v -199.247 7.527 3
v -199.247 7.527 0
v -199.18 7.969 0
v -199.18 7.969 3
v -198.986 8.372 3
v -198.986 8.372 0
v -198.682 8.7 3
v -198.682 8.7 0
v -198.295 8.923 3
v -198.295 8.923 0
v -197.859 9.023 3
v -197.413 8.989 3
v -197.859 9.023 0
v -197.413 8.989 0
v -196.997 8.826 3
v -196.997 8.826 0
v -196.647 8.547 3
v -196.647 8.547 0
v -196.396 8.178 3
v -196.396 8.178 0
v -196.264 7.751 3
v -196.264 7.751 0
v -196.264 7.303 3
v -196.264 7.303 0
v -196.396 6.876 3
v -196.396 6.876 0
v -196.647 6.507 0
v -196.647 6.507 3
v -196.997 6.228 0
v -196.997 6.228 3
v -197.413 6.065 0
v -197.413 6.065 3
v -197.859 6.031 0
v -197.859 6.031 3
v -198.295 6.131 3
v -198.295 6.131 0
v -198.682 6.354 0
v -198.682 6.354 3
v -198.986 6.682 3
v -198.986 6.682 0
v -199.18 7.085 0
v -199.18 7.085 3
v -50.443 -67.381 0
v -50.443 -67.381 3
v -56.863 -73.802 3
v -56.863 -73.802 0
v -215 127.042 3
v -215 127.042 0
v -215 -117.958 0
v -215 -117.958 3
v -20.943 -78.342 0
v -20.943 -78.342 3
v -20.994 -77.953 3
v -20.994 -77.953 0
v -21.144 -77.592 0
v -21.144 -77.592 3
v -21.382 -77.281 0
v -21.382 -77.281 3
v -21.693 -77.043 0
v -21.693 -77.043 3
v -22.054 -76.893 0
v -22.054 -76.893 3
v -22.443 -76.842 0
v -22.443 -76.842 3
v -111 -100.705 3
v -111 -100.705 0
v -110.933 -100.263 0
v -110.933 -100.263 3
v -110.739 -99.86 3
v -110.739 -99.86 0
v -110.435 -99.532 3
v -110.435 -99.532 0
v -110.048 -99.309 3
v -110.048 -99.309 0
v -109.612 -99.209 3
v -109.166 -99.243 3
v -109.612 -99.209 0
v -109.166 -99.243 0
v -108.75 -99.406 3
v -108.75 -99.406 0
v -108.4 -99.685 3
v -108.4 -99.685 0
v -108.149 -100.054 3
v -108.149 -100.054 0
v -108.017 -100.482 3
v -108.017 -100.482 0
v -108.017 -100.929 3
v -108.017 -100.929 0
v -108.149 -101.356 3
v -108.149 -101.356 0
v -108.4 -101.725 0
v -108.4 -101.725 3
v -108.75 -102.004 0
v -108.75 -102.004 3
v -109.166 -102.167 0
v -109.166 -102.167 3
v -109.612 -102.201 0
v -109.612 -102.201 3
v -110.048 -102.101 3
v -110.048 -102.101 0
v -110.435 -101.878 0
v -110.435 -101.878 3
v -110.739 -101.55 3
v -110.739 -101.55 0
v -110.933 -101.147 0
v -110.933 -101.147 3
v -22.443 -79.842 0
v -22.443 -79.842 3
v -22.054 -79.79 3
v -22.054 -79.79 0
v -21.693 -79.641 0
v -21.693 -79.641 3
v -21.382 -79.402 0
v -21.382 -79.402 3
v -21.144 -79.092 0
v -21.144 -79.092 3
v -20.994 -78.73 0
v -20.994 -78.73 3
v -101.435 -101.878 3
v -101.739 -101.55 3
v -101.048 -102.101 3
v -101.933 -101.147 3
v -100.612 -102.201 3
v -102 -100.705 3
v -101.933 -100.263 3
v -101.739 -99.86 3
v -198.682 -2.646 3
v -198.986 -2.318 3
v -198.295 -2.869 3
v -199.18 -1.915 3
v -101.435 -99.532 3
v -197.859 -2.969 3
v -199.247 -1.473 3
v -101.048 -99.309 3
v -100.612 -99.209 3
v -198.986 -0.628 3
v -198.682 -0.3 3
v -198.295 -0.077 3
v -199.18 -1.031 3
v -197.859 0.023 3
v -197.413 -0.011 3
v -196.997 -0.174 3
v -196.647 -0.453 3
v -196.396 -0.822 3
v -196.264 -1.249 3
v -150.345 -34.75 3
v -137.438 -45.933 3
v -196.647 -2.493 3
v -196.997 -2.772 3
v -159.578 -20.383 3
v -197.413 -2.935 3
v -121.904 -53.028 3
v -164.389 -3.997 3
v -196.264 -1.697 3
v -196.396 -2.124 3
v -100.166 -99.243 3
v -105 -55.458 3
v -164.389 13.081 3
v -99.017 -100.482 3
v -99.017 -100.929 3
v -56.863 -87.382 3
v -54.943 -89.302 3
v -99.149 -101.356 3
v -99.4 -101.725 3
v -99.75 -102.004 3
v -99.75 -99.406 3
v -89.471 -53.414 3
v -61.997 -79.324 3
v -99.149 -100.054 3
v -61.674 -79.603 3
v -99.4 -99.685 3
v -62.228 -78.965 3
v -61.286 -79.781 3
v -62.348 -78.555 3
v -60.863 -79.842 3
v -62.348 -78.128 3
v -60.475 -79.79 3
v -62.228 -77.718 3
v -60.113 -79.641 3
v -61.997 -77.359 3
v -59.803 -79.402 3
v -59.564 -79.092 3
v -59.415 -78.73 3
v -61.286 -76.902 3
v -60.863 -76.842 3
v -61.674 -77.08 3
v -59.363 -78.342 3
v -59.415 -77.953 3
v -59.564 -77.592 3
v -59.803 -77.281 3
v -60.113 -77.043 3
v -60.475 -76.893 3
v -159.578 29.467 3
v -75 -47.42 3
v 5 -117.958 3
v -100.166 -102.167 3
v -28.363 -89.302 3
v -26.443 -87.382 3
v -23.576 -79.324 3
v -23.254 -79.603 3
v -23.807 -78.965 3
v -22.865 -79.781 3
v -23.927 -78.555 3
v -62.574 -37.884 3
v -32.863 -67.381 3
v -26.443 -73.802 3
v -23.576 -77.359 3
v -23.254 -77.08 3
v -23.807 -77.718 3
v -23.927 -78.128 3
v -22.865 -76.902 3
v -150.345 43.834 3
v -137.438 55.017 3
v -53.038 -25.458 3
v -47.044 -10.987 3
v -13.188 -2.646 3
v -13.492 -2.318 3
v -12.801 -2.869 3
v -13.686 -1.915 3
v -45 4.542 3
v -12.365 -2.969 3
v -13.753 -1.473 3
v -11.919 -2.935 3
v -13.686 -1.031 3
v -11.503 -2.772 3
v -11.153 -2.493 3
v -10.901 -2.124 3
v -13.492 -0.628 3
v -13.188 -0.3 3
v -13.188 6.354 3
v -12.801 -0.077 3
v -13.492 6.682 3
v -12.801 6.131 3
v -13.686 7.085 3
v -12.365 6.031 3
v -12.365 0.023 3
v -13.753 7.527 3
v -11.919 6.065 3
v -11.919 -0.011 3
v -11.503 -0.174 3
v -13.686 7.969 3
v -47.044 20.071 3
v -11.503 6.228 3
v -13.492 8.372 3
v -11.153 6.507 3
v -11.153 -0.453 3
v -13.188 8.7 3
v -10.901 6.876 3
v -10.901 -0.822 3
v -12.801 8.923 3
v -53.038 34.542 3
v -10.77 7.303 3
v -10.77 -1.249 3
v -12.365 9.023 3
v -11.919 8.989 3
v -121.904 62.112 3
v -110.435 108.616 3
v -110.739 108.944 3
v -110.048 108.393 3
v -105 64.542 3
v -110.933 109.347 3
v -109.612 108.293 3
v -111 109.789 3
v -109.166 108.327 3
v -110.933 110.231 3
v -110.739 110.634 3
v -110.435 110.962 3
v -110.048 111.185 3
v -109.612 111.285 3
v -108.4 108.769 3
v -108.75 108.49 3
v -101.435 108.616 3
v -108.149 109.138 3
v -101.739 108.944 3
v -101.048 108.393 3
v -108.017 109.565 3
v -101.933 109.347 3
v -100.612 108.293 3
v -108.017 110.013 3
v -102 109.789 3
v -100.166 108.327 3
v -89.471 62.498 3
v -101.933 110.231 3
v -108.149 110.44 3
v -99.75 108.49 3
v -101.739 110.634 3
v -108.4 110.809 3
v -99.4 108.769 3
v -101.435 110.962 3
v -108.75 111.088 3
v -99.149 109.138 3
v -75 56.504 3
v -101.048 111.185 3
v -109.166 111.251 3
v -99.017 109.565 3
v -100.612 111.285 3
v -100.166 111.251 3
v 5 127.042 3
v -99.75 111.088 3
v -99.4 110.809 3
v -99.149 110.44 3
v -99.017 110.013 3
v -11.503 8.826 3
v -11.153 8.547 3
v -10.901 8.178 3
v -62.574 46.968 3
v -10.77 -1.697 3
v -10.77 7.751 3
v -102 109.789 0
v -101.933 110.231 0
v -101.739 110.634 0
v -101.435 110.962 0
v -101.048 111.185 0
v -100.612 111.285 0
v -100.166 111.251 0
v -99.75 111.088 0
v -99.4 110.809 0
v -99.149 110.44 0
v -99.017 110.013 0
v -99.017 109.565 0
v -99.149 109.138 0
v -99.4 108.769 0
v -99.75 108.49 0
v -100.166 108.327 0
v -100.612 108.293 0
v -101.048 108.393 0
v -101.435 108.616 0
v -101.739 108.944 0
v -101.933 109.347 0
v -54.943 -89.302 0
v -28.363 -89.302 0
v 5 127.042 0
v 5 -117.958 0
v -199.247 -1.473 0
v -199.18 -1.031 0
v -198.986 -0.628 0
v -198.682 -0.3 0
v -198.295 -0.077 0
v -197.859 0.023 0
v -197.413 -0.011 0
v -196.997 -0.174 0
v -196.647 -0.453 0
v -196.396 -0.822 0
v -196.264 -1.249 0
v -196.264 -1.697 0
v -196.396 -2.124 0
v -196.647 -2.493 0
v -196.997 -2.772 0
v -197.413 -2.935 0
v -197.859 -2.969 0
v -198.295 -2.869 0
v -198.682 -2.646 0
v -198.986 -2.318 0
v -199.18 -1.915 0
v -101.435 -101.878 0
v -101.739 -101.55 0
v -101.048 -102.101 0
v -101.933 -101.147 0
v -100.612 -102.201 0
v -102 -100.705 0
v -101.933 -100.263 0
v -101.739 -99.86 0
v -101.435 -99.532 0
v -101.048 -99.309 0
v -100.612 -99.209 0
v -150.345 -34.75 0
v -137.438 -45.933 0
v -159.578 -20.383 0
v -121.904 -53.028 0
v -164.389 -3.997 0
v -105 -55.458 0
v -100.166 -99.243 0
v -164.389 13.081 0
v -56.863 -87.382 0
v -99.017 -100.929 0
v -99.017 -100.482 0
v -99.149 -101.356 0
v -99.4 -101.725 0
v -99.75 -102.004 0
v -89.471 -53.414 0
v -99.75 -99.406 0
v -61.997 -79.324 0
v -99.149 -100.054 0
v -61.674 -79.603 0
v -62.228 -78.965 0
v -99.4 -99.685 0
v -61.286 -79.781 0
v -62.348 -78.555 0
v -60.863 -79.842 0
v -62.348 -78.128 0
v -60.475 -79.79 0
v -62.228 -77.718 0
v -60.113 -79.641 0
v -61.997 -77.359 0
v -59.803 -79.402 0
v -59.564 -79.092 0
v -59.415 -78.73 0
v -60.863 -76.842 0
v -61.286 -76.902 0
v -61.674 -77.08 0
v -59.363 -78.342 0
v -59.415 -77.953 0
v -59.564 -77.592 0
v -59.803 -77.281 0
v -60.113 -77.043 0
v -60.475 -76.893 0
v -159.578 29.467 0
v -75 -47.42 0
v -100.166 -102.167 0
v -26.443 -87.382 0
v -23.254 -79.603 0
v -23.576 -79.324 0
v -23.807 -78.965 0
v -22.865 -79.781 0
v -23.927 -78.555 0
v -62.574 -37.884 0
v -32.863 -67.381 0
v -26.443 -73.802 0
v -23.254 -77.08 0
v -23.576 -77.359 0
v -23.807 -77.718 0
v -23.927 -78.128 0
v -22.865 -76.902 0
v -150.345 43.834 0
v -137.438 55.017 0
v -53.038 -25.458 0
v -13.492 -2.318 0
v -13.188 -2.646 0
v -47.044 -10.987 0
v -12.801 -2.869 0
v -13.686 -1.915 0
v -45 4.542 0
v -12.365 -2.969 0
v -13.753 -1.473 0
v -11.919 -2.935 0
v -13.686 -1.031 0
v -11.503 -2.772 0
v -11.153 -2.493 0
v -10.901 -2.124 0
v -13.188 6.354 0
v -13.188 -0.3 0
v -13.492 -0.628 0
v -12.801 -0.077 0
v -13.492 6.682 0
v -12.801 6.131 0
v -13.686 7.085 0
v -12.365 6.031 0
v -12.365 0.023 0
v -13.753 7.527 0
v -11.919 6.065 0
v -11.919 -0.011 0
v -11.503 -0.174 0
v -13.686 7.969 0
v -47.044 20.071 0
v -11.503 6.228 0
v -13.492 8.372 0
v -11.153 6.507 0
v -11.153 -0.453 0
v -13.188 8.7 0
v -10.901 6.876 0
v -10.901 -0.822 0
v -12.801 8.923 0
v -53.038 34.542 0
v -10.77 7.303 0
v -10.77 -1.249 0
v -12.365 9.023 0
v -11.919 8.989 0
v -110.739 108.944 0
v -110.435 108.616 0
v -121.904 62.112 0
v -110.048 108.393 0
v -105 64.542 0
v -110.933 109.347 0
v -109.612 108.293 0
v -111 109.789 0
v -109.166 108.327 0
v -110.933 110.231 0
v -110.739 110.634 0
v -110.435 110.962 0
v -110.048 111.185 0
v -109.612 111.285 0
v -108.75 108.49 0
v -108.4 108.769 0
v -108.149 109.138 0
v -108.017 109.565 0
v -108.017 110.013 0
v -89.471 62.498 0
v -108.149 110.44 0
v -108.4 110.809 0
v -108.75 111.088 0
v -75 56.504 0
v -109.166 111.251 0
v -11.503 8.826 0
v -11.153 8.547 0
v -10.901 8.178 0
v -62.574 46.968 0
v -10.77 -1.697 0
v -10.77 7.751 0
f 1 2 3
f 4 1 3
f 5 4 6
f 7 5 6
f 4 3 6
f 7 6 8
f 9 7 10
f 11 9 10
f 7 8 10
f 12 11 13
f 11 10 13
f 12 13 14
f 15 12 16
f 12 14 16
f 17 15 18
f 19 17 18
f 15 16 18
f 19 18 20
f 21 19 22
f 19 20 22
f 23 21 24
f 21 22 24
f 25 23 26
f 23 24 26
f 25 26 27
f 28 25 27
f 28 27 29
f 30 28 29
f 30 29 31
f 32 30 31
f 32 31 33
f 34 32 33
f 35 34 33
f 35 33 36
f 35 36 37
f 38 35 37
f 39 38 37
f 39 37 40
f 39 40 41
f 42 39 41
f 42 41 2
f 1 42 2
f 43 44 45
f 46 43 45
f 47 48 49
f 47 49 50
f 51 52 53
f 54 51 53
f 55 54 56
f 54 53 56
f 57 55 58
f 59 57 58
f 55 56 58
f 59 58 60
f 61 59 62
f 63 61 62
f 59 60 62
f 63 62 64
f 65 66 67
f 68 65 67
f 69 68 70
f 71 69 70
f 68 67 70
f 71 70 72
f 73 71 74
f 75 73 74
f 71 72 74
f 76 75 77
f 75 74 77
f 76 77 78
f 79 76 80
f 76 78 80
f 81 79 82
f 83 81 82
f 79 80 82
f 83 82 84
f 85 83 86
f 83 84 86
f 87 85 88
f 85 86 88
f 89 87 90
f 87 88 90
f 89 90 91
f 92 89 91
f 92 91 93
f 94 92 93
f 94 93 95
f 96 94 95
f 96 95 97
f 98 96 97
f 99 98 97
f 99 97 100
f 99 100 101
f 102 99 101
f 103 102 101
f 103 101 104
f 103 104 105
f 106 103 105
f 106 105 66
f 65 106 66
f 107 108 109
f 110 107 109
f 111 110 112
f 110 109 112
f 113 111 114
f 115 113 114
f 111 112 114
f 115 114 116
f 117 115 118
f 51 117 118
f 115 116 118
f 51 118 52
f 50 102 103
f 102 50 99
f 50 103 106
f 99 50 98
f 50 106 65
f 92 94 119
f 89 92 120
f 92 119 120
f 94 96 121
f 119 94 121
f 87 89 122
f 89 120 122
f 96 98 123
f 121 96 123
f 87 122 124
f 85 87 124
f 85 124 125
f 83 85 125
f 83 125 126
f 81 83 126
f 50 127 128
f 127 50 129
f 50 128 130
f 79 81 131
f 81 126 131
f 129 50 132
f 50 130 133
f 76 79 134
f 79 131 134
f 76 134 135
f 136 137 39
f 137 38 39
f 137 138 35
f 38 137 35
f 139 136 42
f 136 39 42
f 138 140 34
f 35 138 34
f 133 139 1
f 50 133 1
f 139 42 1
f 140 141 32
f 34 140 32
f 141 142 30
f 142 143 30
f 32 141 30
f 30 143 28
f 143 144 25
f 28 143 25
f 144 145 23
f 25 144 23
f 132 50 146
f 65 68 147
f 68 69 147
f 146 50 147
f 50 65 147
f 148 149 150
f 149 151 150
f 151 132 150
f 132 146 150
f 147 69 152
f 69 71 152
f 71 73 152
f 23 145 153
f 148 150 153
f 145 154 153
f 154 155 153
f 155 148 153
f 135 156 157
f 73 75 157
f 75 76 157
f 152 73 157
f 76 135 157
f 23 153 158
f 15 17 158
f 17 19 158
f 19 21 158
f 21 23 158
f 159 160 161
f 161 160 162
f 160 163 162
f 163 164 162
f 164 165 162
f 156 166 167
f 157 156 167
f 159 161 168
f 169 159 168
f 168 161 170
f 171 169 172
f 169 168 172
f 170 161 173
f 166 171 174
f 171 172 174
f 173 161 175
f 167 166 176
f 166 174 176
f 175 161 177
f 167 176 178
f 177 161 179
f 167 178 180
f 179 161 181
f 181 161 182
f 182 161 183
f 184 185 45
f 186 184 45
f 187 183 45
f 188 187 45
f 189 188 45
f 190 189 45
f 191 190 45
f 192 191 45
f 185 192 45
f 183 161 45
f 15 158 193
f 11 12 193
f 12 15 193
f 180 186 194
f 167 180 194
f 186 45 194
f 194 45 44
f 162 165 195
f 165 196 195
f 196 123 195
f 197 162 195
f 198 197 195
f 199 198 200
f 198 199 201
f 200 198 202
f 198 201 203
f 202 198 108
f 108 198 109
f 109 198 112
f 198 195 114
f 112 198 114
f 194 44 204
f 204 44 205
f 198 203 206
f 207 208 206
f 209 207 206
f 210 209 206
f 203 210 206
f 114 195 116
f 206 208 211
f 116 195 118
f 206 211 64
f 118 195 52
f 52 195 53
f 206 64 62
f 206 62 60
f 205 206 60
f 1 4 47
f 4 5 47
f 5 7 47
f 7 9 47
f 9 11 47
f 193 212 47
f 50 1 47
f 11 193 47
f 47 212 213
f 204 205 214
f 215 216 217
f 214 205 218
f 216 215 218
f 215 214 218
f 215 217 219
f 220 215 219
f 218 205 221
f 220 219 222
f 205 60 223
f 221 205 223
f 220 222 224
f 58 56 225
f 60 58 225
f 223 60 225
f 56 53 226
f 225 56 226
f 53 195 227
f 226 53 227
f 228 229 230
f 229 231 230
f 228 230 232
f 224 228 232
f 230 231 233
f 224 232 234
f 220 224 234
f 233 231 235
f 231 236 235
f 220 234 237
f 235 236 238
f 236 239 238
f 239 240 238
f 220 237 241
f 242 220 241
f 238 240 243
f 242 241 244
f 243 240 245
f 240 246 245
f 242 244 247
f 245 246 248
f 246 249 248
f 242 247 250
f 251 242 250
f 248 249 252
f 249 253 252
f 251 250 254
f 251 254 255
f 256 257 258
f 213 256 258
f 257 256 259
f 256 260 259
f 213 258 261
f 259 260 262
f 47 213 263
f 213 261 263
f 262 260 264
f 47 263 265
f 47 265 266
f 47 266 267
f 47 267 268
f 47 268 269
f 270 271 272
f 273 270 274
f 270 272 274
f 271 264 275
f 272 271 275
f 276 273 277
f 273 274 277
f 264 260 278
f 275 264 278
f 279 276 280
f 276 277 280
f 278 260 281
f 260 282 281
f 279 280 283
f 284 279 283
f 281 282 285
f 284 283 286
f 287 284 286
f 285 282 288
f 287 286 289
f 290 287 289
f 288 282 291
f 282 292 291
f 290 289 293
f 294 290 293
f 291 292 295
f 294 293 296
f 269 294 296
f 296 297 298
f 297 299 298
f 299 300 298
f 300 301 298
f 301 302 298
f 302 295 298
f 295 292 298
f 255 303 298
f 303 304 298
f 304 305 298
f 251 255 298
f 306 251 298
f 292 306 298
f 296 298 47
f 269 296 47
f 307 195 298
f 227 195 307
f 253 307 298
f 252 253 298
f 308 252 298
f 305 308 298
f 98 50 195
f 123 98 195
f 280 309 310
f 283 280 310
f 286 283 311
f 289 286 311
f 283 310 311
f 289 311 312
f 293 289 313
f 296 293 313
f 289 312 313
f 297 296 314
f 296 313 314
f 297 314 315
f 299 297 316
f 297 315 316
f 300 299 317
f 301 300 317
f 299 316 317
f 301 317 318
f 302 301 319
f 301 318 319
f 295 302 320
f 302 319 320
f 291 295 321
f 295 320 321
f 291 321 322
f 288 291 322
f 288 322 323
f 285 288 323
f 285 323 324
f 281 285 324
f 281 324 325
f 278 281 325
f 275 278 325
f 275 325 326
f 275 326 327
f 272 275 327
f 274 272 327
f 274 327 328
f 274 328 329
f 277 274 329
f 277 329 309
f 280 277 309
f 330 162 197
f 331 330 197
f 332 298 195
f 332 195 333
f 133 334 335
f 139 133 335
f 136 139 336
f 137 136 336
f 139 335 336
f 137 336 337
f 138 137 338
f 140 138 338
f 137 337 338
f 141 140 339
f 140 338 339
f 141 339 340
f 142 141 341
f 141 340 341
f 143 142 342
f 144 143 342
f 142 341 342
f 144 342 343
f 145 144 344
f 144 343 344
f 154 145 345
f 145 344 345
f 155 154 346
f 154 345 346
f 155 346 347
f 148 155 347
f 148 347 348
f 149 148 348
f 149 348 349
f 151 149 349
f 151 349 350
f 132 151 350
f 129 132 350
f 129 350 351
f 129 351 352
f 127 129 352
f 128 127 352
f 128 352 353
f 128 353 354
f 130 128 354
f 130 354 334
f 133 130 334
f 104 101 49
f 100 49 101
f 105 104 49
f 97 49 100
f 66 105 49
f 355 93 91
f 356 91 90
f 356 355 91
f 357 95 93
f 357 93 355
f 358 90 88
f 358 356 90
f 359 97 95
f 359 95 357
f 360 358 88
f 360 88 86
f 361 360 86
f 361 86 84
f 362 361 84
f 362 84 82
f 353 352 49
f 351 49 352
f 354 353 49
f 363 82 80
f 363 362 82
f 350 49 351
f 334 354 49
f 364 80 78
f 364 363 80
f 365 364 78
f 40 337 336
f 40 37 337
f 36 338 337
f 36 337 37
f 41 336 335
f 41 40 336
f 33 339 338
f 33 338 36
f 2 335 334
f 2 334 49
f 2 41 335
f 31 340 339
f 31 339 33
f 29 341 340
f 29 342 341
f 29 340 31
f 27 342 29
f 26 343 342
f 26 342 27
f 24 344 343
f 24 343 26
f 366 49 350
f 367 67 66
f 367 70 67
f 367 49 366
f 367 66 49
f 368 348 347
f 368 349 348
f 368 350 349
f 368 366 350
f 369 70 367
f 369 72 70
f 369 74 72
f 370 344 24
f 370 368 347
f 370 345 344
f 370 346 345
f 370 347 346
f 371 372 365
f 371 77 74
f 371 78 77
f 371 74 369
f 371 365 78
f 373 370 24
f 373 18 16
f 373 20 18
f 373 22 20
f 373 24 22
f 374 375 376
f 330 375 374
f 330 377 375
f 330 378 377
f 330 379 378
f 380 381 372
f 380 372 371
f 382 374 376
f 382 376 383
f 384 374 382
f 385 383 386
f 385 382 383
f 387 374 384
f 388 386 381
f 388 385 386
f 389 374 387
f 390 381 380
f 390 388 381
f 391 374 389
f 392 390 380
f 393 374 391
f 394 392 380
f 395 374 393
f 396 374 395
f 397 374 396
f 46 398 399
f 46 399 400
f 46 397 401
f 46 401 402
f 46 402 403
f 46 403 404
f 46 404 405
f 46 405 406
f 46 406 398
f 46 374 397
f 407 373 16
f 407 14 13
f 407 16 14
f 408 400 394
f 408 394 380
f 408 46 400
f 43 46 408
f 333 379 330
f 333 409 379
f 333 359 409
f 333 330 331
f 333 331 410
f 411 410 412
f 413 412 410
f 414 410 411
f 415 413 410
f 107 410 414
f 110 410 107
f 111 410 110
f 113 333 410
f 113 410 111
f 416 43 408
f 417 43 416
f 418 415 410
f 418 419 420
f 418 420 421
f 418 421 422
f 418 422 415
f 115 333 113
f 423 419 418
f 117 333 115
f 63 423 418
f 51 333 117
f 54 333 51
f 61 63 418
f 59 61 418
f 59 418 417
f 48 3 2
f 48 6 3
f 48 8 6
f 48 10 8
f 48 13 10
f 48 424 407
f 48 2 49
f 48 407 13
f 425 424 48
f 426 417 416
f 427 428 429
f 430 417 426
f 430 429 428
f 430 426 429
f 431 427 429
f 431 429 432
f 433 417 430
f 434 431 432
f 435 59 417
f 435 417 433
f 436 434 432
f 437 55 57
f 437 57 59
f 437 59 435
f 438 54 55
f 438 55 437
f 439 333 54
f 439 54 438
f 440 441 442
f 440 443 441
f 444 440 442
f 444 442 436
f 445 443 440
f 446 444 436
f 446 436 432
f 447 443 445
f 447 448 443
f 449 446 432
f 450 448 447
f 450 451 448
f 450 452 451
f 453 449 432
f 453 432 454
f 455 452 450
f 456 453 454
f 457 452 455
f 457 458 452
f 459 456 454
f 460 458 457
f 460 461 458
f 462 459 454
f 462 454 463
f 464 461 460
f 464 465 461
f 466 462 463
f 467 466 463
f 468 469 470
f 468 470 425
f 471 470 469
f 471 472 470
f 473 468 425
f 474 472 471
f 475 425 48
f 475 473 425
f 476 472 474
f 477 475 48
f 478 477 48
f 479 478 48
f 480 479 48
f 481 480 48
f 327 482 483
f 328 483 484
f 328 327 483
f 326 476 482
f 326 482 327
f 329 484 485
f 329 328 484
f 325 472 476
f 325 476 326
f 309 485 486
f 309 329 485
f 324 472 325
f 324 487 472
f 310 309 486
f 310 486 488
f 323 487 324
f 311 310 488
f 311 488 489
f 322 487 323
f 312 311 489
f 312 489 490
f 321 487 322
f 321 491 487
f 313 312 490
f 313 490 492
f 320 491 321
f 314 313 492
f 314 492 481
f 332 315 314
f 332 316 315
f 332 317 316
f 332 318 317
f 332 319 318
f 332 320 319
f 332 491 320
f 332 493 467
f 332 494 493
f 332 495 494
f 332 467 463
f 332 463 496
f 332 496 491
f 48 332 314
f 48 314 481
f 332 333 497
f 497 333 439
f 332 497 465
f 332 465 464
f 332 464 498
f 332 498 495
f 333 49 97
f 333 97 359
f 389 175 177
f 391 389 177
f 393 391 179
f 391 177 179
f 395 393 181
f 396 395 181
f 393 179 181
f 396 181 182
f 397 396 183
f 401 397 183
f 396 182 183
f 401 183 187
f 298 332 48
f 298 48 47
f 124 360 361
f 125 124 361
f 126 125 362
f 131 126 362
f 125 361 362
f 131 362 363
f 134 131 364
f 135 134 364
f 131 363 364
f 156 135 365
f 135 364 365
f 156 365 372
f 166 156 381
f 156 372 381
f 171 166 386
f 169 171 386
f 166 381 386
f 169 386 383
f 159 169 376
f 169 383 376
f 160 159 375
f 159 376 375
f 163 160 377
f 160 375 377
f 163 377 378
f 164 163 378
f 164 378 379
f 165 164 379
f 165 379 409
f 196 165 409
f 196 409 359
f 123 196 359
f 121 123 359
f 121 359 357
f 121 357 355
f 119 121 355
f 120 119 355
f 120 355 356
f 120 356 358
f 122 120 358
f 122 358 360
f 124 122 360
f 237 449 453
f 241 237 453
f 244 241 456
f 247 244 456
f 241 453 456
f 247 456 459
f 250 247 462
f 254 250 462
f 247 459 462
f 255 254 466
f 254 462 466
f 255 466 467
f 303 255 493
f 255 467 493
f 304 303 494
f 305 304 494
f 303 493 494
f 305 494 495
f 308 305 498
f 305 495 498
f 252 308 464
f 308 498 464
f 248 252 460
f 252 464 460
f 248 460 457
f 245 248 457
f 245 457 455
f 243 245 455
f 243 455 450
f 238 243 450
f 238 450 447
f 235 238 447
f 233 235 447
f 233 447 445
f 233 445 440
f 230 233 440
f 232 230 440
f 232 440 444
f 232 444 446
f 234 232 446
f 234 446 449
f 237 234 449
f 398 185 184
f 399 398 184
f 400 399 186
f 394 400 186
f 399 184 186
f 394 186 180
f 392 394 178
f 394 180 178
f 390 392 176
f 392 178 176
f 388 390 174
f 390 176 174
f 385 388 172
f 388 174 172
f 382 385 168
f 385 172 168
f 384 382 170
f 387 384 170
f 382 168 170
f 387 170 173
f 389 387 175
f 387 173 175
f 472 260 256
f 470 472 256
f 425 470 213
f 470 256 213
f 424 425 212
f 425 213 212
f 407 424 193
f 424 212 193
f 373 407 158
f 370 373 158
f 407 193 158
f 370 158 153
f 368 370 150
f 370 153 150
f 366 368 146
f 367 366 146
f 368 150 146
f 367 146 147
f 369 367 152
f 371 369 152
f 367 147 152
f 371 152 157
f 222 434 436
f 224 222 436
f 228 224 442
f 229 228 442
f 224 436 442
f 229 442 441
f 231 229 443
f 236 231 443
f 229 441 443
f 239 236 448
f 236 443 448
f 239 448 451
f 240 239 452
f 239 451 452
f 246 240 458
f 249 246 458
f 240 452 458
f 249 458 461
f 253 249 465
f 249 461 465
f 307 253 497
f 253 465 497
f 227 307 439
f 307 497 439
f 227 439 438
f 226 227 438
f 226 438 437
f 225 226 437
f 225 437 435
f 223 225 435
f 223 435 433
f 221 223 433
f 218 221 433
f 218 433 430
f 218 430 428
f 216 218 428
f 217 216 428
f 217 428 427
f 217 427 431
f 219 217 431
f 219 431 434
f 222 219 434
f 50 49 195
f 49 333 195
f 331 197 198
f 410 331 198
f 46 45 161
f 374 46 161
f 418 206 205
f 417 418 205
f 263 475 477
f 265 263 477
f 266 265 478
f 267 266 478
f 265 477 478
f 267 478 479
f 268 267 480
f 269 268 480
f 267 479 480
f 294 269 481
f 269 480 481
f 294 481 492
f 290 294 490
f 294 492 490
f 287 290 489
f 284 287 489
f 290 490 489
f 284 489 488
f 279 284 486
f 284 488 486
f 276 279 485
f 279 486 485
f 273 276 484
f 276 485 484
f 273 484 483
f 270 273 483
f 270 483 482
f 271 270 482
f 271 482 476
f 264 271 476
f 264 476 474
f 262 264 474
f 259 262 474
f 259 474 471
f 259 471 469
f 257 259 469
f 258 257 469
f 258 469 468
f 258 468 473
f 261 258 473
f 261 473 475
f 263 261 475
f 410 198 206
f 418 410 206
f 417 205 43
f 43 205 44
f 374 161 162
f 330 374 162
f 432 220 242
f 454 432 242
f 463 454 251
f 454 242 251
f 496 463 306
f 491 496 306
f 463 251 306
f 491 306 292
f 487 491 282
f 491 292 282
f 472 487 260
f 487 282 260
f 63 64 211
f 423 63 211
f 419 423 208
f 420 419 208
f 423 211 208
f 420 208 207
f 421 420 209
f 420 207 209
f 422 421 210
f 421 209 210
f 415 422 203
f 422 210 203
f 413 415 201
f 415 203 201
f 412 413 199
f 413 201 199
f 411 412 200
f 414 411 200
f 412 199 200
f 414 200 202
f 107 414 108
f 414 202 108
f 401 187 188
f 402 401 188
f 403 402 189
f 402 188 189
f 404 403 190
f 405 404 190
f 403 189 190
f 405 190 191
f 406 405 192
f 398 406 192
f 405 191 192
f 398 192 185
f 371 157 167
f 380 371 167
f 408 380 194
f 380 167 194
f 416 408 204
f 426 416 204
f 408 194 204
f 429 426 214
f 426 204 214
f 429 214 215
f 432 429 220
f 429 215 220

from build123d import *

# Parameters (mm, degrees)
SKETCH1_W           = 210
SKETCH1_H           = 245
BOSS_EXTRUDE1_DEPTH = 3
CUT_EXTRUDE1_DEPTH  = 3
CUT_EXTRUDE2_DEPTH  = 3
CUT_EXTRUDE3_DEPTH  = 246.456036562
SKETCH5_W           = 3
SKETCH5_H           = 245
BOSS_EXTRUDE2_DEPTH = 5
SKETCH6_W           = 3
SKETCH6_H           = 245
BOSS_EXTRUDE3_DEPTH = 5
SKETCH7_R           = 1.5
CUT_EXTRUDE4_DEPTH  = 10


with BuildPart() as part:
    # Sketch1 → Boss-Extrude1 (new body)
    with BuildSketch(Plane.XY):
        with Locations((-105, 4.541984733)):
            Rectangle(SKETCH1_W, SKETCH1_H)
    extrude(amount=BOSS_EXTRUDE1_DEPTH)

    # Sketch2 → Cut-Extrude1 (cut)
    with BuildSketch(Plane.XY.offset(3)):
        with BuildLine():
            ThreePointArc((-45, 4.541984733), (-62.573593129, 46.968391604), (-105, 64.541984733))
            Line((-105, 64.541984733), (-105, -55.458015267))
            ThreePointArc((-105, -55.458015267), (-62.573593129, -37.884422138), (-45, 4.541984733))
        make_face()
        with BuildLine():
            Line((-105, -55.458015267), (-105, 64.541984733))
            ThreePointArc((-105, 64.541984733), (-165, 4.541984733), (-105, -55.458015267))
        make_face()
    extrude(amount=-CUT_EXTRUDE1_DEPTH, mode=Mode.SUBTRACT)

    # Sketch3 → Cut-Extrude2 (cut)
    with BuildSketch(Plane.XY.offset(3)):
        Polygon((-41.653041136, -88.602014661), (-41.653041136, -68.081199381), (-50.153041136, -68.081199381), (-56.163448776, -74.091607021), (-56.163448776, -87.091607021), (-54.653041136, -88.602014661), align=None)
        Polygon((-41.653041136, -68.081199381), (-41.653041136, -67.381199381), (-50.442990629, -67.381199381), (-56.863448776, -73.801657527), (-56.863448776, -87.381556515), (-54.942990629, -89.302014661), (-41.653041136, -89.302014661), (-41.653041136, -88.602014661), (-54.653041136, -88.602014661), (-56.163448776, -87.091607021), (-56.163448776, -74.091607021), (-50.153041136, -68.081199381), align=None)
        Polygon((-33.153041136, -68.081199381), (-41.653041136, -68.081199381), (-41.653041136, -88.602014661), (-28.653041136, -88.602014661), (-27.142633496, -87.091607021), (-27.142633496, -74.091607021), align=None)
        Polygon((-32.863091642, -67.381199381), (-41.653041136, -67.381199381), (-41.653041136, -68.081199381), (-33.153041136, -68.081199381), (-27.142633496, -74.091607021), (-27.142633496, -87.091607021), (-28.653041136, -88.602014661), (-41.653041136, -88.602014661), (-41.653041136, -89.302014661), (-28.363091642, -89.302014661), (-26.442633496, -87.381556515), (-26.442633496, -73.801657527), align=None)
    extrude(amount=-CUT_EXTRUDE2_DEPTH, mode=Mode.SUBTRACT)

    # Sketch4 → Cut-Extrude3 (cut, through all)
    with BuildSketch(Plane.XY.offset(3)):
        with BuildLine():
            ThreePointArc((-60.863448776, -76.841607021), (-62.363448776, -78.341607021), (-60.863448776, -79.841607021))
            Line((-60.863448776, -79.841607021), (-60.863448776, -76.841607021))
        make_face()
        with BuildLine():
            Line((-60.863448776, -76.841607021), (-60.863448776, -79.841607021))
            ThreePointArc((-60.863448776, -79.841607021), (-59.802788604, -79.402267193), (-59.363448776, -78.341607021))
            ThreePointArc((-59.363448776, -78.341607021), (-59.802788604, -77.280946849), (-60.863448776, -76.841607021))
        make_face()
        with BuildLine():
            ThreePointArc((-22.442633496, -76.841607021), (-23.942633496, -78.341607021), (-22.442633496, -79.841607021))
            Line((-22.442633496, -79.841607021), (-22.442633496, -76.841607021))
        make_face()
        with BuildLine():
            Line((-22.442633496, -76.841607021), (-22.442633496, -79.841607021))
            ThreePointArc((-22.442633496, -79.841607021), (-21.381973324, -79.402267193), (-20.942633496, -78.341607021))
            ThreePointArc((-20.942633496, -78.341607021), (-21.381973324, -77.280946849), (-22.442633496, -76.841607021))
        make_face()
    extrude(amount=-CUT_EXTRUDE3_DEPTH, mode=Mode.SUBTRACT)

    # Sketch5 → Boss-Extrude2 (add)
    with BuildSketch(Plane(origin=(0, 0, 0), x_dir=(0, 0, -1), z_dir=(1, 0, 0))):
        with Locations((-1.5, 4.541984733)):
            Rectangle(SKETCH5_W, SKETCH5_H)
    extrude(amount=BOSS_EXTRUDE2_DEPTH)

    # Sketch6 → Boss-Extrude3 (add)
    with BuildSketch(Plane.ZY.offset(210)):
        with Locations((1.5, 4.541984733)):
            Rectangle(SKETCH6_W, SKETCH6_H)
    extrude(amount=BOSS_EXTRUDE3_DEPTH)

    # Sketch7 → Cut-Extrude4 (cut)
    with BuildSketch(Plane(origin=(0, 0, 0), x_dir=(-1, 0, 0), z_dir=(0, 0, -1))):
        with Locations((100.5, -100.70506409)):
            Circle(SKETCH7_R)
        with Locations((100.5, 109.789033556)):
            Circle(SKETCH7_R)
        with Locations((12.252951177, -1.473015267)):
            Circle(SKETCH7_R)
        with Locations((12.252951177, 7.526984733)):
            Circle(SKETCH7_R)
        with Locations((109.5, -100.70506409)):
            Circle(SKETCH7_R)
        with Locations((109.5, 109.789033556)):
            Circle(SKETCH7_R)
        with Locations((197.747048823, -1.473015267)):
            Circle(SKETCH7_R)
        with Locations((197.747048823, 7.526984733)):
            Circle(SKETCH7_R)
    extrude(amount=-CUT_EXTRUDE4_DEPTH, mode=Mode.SUBTRACT)


solid = part.part
